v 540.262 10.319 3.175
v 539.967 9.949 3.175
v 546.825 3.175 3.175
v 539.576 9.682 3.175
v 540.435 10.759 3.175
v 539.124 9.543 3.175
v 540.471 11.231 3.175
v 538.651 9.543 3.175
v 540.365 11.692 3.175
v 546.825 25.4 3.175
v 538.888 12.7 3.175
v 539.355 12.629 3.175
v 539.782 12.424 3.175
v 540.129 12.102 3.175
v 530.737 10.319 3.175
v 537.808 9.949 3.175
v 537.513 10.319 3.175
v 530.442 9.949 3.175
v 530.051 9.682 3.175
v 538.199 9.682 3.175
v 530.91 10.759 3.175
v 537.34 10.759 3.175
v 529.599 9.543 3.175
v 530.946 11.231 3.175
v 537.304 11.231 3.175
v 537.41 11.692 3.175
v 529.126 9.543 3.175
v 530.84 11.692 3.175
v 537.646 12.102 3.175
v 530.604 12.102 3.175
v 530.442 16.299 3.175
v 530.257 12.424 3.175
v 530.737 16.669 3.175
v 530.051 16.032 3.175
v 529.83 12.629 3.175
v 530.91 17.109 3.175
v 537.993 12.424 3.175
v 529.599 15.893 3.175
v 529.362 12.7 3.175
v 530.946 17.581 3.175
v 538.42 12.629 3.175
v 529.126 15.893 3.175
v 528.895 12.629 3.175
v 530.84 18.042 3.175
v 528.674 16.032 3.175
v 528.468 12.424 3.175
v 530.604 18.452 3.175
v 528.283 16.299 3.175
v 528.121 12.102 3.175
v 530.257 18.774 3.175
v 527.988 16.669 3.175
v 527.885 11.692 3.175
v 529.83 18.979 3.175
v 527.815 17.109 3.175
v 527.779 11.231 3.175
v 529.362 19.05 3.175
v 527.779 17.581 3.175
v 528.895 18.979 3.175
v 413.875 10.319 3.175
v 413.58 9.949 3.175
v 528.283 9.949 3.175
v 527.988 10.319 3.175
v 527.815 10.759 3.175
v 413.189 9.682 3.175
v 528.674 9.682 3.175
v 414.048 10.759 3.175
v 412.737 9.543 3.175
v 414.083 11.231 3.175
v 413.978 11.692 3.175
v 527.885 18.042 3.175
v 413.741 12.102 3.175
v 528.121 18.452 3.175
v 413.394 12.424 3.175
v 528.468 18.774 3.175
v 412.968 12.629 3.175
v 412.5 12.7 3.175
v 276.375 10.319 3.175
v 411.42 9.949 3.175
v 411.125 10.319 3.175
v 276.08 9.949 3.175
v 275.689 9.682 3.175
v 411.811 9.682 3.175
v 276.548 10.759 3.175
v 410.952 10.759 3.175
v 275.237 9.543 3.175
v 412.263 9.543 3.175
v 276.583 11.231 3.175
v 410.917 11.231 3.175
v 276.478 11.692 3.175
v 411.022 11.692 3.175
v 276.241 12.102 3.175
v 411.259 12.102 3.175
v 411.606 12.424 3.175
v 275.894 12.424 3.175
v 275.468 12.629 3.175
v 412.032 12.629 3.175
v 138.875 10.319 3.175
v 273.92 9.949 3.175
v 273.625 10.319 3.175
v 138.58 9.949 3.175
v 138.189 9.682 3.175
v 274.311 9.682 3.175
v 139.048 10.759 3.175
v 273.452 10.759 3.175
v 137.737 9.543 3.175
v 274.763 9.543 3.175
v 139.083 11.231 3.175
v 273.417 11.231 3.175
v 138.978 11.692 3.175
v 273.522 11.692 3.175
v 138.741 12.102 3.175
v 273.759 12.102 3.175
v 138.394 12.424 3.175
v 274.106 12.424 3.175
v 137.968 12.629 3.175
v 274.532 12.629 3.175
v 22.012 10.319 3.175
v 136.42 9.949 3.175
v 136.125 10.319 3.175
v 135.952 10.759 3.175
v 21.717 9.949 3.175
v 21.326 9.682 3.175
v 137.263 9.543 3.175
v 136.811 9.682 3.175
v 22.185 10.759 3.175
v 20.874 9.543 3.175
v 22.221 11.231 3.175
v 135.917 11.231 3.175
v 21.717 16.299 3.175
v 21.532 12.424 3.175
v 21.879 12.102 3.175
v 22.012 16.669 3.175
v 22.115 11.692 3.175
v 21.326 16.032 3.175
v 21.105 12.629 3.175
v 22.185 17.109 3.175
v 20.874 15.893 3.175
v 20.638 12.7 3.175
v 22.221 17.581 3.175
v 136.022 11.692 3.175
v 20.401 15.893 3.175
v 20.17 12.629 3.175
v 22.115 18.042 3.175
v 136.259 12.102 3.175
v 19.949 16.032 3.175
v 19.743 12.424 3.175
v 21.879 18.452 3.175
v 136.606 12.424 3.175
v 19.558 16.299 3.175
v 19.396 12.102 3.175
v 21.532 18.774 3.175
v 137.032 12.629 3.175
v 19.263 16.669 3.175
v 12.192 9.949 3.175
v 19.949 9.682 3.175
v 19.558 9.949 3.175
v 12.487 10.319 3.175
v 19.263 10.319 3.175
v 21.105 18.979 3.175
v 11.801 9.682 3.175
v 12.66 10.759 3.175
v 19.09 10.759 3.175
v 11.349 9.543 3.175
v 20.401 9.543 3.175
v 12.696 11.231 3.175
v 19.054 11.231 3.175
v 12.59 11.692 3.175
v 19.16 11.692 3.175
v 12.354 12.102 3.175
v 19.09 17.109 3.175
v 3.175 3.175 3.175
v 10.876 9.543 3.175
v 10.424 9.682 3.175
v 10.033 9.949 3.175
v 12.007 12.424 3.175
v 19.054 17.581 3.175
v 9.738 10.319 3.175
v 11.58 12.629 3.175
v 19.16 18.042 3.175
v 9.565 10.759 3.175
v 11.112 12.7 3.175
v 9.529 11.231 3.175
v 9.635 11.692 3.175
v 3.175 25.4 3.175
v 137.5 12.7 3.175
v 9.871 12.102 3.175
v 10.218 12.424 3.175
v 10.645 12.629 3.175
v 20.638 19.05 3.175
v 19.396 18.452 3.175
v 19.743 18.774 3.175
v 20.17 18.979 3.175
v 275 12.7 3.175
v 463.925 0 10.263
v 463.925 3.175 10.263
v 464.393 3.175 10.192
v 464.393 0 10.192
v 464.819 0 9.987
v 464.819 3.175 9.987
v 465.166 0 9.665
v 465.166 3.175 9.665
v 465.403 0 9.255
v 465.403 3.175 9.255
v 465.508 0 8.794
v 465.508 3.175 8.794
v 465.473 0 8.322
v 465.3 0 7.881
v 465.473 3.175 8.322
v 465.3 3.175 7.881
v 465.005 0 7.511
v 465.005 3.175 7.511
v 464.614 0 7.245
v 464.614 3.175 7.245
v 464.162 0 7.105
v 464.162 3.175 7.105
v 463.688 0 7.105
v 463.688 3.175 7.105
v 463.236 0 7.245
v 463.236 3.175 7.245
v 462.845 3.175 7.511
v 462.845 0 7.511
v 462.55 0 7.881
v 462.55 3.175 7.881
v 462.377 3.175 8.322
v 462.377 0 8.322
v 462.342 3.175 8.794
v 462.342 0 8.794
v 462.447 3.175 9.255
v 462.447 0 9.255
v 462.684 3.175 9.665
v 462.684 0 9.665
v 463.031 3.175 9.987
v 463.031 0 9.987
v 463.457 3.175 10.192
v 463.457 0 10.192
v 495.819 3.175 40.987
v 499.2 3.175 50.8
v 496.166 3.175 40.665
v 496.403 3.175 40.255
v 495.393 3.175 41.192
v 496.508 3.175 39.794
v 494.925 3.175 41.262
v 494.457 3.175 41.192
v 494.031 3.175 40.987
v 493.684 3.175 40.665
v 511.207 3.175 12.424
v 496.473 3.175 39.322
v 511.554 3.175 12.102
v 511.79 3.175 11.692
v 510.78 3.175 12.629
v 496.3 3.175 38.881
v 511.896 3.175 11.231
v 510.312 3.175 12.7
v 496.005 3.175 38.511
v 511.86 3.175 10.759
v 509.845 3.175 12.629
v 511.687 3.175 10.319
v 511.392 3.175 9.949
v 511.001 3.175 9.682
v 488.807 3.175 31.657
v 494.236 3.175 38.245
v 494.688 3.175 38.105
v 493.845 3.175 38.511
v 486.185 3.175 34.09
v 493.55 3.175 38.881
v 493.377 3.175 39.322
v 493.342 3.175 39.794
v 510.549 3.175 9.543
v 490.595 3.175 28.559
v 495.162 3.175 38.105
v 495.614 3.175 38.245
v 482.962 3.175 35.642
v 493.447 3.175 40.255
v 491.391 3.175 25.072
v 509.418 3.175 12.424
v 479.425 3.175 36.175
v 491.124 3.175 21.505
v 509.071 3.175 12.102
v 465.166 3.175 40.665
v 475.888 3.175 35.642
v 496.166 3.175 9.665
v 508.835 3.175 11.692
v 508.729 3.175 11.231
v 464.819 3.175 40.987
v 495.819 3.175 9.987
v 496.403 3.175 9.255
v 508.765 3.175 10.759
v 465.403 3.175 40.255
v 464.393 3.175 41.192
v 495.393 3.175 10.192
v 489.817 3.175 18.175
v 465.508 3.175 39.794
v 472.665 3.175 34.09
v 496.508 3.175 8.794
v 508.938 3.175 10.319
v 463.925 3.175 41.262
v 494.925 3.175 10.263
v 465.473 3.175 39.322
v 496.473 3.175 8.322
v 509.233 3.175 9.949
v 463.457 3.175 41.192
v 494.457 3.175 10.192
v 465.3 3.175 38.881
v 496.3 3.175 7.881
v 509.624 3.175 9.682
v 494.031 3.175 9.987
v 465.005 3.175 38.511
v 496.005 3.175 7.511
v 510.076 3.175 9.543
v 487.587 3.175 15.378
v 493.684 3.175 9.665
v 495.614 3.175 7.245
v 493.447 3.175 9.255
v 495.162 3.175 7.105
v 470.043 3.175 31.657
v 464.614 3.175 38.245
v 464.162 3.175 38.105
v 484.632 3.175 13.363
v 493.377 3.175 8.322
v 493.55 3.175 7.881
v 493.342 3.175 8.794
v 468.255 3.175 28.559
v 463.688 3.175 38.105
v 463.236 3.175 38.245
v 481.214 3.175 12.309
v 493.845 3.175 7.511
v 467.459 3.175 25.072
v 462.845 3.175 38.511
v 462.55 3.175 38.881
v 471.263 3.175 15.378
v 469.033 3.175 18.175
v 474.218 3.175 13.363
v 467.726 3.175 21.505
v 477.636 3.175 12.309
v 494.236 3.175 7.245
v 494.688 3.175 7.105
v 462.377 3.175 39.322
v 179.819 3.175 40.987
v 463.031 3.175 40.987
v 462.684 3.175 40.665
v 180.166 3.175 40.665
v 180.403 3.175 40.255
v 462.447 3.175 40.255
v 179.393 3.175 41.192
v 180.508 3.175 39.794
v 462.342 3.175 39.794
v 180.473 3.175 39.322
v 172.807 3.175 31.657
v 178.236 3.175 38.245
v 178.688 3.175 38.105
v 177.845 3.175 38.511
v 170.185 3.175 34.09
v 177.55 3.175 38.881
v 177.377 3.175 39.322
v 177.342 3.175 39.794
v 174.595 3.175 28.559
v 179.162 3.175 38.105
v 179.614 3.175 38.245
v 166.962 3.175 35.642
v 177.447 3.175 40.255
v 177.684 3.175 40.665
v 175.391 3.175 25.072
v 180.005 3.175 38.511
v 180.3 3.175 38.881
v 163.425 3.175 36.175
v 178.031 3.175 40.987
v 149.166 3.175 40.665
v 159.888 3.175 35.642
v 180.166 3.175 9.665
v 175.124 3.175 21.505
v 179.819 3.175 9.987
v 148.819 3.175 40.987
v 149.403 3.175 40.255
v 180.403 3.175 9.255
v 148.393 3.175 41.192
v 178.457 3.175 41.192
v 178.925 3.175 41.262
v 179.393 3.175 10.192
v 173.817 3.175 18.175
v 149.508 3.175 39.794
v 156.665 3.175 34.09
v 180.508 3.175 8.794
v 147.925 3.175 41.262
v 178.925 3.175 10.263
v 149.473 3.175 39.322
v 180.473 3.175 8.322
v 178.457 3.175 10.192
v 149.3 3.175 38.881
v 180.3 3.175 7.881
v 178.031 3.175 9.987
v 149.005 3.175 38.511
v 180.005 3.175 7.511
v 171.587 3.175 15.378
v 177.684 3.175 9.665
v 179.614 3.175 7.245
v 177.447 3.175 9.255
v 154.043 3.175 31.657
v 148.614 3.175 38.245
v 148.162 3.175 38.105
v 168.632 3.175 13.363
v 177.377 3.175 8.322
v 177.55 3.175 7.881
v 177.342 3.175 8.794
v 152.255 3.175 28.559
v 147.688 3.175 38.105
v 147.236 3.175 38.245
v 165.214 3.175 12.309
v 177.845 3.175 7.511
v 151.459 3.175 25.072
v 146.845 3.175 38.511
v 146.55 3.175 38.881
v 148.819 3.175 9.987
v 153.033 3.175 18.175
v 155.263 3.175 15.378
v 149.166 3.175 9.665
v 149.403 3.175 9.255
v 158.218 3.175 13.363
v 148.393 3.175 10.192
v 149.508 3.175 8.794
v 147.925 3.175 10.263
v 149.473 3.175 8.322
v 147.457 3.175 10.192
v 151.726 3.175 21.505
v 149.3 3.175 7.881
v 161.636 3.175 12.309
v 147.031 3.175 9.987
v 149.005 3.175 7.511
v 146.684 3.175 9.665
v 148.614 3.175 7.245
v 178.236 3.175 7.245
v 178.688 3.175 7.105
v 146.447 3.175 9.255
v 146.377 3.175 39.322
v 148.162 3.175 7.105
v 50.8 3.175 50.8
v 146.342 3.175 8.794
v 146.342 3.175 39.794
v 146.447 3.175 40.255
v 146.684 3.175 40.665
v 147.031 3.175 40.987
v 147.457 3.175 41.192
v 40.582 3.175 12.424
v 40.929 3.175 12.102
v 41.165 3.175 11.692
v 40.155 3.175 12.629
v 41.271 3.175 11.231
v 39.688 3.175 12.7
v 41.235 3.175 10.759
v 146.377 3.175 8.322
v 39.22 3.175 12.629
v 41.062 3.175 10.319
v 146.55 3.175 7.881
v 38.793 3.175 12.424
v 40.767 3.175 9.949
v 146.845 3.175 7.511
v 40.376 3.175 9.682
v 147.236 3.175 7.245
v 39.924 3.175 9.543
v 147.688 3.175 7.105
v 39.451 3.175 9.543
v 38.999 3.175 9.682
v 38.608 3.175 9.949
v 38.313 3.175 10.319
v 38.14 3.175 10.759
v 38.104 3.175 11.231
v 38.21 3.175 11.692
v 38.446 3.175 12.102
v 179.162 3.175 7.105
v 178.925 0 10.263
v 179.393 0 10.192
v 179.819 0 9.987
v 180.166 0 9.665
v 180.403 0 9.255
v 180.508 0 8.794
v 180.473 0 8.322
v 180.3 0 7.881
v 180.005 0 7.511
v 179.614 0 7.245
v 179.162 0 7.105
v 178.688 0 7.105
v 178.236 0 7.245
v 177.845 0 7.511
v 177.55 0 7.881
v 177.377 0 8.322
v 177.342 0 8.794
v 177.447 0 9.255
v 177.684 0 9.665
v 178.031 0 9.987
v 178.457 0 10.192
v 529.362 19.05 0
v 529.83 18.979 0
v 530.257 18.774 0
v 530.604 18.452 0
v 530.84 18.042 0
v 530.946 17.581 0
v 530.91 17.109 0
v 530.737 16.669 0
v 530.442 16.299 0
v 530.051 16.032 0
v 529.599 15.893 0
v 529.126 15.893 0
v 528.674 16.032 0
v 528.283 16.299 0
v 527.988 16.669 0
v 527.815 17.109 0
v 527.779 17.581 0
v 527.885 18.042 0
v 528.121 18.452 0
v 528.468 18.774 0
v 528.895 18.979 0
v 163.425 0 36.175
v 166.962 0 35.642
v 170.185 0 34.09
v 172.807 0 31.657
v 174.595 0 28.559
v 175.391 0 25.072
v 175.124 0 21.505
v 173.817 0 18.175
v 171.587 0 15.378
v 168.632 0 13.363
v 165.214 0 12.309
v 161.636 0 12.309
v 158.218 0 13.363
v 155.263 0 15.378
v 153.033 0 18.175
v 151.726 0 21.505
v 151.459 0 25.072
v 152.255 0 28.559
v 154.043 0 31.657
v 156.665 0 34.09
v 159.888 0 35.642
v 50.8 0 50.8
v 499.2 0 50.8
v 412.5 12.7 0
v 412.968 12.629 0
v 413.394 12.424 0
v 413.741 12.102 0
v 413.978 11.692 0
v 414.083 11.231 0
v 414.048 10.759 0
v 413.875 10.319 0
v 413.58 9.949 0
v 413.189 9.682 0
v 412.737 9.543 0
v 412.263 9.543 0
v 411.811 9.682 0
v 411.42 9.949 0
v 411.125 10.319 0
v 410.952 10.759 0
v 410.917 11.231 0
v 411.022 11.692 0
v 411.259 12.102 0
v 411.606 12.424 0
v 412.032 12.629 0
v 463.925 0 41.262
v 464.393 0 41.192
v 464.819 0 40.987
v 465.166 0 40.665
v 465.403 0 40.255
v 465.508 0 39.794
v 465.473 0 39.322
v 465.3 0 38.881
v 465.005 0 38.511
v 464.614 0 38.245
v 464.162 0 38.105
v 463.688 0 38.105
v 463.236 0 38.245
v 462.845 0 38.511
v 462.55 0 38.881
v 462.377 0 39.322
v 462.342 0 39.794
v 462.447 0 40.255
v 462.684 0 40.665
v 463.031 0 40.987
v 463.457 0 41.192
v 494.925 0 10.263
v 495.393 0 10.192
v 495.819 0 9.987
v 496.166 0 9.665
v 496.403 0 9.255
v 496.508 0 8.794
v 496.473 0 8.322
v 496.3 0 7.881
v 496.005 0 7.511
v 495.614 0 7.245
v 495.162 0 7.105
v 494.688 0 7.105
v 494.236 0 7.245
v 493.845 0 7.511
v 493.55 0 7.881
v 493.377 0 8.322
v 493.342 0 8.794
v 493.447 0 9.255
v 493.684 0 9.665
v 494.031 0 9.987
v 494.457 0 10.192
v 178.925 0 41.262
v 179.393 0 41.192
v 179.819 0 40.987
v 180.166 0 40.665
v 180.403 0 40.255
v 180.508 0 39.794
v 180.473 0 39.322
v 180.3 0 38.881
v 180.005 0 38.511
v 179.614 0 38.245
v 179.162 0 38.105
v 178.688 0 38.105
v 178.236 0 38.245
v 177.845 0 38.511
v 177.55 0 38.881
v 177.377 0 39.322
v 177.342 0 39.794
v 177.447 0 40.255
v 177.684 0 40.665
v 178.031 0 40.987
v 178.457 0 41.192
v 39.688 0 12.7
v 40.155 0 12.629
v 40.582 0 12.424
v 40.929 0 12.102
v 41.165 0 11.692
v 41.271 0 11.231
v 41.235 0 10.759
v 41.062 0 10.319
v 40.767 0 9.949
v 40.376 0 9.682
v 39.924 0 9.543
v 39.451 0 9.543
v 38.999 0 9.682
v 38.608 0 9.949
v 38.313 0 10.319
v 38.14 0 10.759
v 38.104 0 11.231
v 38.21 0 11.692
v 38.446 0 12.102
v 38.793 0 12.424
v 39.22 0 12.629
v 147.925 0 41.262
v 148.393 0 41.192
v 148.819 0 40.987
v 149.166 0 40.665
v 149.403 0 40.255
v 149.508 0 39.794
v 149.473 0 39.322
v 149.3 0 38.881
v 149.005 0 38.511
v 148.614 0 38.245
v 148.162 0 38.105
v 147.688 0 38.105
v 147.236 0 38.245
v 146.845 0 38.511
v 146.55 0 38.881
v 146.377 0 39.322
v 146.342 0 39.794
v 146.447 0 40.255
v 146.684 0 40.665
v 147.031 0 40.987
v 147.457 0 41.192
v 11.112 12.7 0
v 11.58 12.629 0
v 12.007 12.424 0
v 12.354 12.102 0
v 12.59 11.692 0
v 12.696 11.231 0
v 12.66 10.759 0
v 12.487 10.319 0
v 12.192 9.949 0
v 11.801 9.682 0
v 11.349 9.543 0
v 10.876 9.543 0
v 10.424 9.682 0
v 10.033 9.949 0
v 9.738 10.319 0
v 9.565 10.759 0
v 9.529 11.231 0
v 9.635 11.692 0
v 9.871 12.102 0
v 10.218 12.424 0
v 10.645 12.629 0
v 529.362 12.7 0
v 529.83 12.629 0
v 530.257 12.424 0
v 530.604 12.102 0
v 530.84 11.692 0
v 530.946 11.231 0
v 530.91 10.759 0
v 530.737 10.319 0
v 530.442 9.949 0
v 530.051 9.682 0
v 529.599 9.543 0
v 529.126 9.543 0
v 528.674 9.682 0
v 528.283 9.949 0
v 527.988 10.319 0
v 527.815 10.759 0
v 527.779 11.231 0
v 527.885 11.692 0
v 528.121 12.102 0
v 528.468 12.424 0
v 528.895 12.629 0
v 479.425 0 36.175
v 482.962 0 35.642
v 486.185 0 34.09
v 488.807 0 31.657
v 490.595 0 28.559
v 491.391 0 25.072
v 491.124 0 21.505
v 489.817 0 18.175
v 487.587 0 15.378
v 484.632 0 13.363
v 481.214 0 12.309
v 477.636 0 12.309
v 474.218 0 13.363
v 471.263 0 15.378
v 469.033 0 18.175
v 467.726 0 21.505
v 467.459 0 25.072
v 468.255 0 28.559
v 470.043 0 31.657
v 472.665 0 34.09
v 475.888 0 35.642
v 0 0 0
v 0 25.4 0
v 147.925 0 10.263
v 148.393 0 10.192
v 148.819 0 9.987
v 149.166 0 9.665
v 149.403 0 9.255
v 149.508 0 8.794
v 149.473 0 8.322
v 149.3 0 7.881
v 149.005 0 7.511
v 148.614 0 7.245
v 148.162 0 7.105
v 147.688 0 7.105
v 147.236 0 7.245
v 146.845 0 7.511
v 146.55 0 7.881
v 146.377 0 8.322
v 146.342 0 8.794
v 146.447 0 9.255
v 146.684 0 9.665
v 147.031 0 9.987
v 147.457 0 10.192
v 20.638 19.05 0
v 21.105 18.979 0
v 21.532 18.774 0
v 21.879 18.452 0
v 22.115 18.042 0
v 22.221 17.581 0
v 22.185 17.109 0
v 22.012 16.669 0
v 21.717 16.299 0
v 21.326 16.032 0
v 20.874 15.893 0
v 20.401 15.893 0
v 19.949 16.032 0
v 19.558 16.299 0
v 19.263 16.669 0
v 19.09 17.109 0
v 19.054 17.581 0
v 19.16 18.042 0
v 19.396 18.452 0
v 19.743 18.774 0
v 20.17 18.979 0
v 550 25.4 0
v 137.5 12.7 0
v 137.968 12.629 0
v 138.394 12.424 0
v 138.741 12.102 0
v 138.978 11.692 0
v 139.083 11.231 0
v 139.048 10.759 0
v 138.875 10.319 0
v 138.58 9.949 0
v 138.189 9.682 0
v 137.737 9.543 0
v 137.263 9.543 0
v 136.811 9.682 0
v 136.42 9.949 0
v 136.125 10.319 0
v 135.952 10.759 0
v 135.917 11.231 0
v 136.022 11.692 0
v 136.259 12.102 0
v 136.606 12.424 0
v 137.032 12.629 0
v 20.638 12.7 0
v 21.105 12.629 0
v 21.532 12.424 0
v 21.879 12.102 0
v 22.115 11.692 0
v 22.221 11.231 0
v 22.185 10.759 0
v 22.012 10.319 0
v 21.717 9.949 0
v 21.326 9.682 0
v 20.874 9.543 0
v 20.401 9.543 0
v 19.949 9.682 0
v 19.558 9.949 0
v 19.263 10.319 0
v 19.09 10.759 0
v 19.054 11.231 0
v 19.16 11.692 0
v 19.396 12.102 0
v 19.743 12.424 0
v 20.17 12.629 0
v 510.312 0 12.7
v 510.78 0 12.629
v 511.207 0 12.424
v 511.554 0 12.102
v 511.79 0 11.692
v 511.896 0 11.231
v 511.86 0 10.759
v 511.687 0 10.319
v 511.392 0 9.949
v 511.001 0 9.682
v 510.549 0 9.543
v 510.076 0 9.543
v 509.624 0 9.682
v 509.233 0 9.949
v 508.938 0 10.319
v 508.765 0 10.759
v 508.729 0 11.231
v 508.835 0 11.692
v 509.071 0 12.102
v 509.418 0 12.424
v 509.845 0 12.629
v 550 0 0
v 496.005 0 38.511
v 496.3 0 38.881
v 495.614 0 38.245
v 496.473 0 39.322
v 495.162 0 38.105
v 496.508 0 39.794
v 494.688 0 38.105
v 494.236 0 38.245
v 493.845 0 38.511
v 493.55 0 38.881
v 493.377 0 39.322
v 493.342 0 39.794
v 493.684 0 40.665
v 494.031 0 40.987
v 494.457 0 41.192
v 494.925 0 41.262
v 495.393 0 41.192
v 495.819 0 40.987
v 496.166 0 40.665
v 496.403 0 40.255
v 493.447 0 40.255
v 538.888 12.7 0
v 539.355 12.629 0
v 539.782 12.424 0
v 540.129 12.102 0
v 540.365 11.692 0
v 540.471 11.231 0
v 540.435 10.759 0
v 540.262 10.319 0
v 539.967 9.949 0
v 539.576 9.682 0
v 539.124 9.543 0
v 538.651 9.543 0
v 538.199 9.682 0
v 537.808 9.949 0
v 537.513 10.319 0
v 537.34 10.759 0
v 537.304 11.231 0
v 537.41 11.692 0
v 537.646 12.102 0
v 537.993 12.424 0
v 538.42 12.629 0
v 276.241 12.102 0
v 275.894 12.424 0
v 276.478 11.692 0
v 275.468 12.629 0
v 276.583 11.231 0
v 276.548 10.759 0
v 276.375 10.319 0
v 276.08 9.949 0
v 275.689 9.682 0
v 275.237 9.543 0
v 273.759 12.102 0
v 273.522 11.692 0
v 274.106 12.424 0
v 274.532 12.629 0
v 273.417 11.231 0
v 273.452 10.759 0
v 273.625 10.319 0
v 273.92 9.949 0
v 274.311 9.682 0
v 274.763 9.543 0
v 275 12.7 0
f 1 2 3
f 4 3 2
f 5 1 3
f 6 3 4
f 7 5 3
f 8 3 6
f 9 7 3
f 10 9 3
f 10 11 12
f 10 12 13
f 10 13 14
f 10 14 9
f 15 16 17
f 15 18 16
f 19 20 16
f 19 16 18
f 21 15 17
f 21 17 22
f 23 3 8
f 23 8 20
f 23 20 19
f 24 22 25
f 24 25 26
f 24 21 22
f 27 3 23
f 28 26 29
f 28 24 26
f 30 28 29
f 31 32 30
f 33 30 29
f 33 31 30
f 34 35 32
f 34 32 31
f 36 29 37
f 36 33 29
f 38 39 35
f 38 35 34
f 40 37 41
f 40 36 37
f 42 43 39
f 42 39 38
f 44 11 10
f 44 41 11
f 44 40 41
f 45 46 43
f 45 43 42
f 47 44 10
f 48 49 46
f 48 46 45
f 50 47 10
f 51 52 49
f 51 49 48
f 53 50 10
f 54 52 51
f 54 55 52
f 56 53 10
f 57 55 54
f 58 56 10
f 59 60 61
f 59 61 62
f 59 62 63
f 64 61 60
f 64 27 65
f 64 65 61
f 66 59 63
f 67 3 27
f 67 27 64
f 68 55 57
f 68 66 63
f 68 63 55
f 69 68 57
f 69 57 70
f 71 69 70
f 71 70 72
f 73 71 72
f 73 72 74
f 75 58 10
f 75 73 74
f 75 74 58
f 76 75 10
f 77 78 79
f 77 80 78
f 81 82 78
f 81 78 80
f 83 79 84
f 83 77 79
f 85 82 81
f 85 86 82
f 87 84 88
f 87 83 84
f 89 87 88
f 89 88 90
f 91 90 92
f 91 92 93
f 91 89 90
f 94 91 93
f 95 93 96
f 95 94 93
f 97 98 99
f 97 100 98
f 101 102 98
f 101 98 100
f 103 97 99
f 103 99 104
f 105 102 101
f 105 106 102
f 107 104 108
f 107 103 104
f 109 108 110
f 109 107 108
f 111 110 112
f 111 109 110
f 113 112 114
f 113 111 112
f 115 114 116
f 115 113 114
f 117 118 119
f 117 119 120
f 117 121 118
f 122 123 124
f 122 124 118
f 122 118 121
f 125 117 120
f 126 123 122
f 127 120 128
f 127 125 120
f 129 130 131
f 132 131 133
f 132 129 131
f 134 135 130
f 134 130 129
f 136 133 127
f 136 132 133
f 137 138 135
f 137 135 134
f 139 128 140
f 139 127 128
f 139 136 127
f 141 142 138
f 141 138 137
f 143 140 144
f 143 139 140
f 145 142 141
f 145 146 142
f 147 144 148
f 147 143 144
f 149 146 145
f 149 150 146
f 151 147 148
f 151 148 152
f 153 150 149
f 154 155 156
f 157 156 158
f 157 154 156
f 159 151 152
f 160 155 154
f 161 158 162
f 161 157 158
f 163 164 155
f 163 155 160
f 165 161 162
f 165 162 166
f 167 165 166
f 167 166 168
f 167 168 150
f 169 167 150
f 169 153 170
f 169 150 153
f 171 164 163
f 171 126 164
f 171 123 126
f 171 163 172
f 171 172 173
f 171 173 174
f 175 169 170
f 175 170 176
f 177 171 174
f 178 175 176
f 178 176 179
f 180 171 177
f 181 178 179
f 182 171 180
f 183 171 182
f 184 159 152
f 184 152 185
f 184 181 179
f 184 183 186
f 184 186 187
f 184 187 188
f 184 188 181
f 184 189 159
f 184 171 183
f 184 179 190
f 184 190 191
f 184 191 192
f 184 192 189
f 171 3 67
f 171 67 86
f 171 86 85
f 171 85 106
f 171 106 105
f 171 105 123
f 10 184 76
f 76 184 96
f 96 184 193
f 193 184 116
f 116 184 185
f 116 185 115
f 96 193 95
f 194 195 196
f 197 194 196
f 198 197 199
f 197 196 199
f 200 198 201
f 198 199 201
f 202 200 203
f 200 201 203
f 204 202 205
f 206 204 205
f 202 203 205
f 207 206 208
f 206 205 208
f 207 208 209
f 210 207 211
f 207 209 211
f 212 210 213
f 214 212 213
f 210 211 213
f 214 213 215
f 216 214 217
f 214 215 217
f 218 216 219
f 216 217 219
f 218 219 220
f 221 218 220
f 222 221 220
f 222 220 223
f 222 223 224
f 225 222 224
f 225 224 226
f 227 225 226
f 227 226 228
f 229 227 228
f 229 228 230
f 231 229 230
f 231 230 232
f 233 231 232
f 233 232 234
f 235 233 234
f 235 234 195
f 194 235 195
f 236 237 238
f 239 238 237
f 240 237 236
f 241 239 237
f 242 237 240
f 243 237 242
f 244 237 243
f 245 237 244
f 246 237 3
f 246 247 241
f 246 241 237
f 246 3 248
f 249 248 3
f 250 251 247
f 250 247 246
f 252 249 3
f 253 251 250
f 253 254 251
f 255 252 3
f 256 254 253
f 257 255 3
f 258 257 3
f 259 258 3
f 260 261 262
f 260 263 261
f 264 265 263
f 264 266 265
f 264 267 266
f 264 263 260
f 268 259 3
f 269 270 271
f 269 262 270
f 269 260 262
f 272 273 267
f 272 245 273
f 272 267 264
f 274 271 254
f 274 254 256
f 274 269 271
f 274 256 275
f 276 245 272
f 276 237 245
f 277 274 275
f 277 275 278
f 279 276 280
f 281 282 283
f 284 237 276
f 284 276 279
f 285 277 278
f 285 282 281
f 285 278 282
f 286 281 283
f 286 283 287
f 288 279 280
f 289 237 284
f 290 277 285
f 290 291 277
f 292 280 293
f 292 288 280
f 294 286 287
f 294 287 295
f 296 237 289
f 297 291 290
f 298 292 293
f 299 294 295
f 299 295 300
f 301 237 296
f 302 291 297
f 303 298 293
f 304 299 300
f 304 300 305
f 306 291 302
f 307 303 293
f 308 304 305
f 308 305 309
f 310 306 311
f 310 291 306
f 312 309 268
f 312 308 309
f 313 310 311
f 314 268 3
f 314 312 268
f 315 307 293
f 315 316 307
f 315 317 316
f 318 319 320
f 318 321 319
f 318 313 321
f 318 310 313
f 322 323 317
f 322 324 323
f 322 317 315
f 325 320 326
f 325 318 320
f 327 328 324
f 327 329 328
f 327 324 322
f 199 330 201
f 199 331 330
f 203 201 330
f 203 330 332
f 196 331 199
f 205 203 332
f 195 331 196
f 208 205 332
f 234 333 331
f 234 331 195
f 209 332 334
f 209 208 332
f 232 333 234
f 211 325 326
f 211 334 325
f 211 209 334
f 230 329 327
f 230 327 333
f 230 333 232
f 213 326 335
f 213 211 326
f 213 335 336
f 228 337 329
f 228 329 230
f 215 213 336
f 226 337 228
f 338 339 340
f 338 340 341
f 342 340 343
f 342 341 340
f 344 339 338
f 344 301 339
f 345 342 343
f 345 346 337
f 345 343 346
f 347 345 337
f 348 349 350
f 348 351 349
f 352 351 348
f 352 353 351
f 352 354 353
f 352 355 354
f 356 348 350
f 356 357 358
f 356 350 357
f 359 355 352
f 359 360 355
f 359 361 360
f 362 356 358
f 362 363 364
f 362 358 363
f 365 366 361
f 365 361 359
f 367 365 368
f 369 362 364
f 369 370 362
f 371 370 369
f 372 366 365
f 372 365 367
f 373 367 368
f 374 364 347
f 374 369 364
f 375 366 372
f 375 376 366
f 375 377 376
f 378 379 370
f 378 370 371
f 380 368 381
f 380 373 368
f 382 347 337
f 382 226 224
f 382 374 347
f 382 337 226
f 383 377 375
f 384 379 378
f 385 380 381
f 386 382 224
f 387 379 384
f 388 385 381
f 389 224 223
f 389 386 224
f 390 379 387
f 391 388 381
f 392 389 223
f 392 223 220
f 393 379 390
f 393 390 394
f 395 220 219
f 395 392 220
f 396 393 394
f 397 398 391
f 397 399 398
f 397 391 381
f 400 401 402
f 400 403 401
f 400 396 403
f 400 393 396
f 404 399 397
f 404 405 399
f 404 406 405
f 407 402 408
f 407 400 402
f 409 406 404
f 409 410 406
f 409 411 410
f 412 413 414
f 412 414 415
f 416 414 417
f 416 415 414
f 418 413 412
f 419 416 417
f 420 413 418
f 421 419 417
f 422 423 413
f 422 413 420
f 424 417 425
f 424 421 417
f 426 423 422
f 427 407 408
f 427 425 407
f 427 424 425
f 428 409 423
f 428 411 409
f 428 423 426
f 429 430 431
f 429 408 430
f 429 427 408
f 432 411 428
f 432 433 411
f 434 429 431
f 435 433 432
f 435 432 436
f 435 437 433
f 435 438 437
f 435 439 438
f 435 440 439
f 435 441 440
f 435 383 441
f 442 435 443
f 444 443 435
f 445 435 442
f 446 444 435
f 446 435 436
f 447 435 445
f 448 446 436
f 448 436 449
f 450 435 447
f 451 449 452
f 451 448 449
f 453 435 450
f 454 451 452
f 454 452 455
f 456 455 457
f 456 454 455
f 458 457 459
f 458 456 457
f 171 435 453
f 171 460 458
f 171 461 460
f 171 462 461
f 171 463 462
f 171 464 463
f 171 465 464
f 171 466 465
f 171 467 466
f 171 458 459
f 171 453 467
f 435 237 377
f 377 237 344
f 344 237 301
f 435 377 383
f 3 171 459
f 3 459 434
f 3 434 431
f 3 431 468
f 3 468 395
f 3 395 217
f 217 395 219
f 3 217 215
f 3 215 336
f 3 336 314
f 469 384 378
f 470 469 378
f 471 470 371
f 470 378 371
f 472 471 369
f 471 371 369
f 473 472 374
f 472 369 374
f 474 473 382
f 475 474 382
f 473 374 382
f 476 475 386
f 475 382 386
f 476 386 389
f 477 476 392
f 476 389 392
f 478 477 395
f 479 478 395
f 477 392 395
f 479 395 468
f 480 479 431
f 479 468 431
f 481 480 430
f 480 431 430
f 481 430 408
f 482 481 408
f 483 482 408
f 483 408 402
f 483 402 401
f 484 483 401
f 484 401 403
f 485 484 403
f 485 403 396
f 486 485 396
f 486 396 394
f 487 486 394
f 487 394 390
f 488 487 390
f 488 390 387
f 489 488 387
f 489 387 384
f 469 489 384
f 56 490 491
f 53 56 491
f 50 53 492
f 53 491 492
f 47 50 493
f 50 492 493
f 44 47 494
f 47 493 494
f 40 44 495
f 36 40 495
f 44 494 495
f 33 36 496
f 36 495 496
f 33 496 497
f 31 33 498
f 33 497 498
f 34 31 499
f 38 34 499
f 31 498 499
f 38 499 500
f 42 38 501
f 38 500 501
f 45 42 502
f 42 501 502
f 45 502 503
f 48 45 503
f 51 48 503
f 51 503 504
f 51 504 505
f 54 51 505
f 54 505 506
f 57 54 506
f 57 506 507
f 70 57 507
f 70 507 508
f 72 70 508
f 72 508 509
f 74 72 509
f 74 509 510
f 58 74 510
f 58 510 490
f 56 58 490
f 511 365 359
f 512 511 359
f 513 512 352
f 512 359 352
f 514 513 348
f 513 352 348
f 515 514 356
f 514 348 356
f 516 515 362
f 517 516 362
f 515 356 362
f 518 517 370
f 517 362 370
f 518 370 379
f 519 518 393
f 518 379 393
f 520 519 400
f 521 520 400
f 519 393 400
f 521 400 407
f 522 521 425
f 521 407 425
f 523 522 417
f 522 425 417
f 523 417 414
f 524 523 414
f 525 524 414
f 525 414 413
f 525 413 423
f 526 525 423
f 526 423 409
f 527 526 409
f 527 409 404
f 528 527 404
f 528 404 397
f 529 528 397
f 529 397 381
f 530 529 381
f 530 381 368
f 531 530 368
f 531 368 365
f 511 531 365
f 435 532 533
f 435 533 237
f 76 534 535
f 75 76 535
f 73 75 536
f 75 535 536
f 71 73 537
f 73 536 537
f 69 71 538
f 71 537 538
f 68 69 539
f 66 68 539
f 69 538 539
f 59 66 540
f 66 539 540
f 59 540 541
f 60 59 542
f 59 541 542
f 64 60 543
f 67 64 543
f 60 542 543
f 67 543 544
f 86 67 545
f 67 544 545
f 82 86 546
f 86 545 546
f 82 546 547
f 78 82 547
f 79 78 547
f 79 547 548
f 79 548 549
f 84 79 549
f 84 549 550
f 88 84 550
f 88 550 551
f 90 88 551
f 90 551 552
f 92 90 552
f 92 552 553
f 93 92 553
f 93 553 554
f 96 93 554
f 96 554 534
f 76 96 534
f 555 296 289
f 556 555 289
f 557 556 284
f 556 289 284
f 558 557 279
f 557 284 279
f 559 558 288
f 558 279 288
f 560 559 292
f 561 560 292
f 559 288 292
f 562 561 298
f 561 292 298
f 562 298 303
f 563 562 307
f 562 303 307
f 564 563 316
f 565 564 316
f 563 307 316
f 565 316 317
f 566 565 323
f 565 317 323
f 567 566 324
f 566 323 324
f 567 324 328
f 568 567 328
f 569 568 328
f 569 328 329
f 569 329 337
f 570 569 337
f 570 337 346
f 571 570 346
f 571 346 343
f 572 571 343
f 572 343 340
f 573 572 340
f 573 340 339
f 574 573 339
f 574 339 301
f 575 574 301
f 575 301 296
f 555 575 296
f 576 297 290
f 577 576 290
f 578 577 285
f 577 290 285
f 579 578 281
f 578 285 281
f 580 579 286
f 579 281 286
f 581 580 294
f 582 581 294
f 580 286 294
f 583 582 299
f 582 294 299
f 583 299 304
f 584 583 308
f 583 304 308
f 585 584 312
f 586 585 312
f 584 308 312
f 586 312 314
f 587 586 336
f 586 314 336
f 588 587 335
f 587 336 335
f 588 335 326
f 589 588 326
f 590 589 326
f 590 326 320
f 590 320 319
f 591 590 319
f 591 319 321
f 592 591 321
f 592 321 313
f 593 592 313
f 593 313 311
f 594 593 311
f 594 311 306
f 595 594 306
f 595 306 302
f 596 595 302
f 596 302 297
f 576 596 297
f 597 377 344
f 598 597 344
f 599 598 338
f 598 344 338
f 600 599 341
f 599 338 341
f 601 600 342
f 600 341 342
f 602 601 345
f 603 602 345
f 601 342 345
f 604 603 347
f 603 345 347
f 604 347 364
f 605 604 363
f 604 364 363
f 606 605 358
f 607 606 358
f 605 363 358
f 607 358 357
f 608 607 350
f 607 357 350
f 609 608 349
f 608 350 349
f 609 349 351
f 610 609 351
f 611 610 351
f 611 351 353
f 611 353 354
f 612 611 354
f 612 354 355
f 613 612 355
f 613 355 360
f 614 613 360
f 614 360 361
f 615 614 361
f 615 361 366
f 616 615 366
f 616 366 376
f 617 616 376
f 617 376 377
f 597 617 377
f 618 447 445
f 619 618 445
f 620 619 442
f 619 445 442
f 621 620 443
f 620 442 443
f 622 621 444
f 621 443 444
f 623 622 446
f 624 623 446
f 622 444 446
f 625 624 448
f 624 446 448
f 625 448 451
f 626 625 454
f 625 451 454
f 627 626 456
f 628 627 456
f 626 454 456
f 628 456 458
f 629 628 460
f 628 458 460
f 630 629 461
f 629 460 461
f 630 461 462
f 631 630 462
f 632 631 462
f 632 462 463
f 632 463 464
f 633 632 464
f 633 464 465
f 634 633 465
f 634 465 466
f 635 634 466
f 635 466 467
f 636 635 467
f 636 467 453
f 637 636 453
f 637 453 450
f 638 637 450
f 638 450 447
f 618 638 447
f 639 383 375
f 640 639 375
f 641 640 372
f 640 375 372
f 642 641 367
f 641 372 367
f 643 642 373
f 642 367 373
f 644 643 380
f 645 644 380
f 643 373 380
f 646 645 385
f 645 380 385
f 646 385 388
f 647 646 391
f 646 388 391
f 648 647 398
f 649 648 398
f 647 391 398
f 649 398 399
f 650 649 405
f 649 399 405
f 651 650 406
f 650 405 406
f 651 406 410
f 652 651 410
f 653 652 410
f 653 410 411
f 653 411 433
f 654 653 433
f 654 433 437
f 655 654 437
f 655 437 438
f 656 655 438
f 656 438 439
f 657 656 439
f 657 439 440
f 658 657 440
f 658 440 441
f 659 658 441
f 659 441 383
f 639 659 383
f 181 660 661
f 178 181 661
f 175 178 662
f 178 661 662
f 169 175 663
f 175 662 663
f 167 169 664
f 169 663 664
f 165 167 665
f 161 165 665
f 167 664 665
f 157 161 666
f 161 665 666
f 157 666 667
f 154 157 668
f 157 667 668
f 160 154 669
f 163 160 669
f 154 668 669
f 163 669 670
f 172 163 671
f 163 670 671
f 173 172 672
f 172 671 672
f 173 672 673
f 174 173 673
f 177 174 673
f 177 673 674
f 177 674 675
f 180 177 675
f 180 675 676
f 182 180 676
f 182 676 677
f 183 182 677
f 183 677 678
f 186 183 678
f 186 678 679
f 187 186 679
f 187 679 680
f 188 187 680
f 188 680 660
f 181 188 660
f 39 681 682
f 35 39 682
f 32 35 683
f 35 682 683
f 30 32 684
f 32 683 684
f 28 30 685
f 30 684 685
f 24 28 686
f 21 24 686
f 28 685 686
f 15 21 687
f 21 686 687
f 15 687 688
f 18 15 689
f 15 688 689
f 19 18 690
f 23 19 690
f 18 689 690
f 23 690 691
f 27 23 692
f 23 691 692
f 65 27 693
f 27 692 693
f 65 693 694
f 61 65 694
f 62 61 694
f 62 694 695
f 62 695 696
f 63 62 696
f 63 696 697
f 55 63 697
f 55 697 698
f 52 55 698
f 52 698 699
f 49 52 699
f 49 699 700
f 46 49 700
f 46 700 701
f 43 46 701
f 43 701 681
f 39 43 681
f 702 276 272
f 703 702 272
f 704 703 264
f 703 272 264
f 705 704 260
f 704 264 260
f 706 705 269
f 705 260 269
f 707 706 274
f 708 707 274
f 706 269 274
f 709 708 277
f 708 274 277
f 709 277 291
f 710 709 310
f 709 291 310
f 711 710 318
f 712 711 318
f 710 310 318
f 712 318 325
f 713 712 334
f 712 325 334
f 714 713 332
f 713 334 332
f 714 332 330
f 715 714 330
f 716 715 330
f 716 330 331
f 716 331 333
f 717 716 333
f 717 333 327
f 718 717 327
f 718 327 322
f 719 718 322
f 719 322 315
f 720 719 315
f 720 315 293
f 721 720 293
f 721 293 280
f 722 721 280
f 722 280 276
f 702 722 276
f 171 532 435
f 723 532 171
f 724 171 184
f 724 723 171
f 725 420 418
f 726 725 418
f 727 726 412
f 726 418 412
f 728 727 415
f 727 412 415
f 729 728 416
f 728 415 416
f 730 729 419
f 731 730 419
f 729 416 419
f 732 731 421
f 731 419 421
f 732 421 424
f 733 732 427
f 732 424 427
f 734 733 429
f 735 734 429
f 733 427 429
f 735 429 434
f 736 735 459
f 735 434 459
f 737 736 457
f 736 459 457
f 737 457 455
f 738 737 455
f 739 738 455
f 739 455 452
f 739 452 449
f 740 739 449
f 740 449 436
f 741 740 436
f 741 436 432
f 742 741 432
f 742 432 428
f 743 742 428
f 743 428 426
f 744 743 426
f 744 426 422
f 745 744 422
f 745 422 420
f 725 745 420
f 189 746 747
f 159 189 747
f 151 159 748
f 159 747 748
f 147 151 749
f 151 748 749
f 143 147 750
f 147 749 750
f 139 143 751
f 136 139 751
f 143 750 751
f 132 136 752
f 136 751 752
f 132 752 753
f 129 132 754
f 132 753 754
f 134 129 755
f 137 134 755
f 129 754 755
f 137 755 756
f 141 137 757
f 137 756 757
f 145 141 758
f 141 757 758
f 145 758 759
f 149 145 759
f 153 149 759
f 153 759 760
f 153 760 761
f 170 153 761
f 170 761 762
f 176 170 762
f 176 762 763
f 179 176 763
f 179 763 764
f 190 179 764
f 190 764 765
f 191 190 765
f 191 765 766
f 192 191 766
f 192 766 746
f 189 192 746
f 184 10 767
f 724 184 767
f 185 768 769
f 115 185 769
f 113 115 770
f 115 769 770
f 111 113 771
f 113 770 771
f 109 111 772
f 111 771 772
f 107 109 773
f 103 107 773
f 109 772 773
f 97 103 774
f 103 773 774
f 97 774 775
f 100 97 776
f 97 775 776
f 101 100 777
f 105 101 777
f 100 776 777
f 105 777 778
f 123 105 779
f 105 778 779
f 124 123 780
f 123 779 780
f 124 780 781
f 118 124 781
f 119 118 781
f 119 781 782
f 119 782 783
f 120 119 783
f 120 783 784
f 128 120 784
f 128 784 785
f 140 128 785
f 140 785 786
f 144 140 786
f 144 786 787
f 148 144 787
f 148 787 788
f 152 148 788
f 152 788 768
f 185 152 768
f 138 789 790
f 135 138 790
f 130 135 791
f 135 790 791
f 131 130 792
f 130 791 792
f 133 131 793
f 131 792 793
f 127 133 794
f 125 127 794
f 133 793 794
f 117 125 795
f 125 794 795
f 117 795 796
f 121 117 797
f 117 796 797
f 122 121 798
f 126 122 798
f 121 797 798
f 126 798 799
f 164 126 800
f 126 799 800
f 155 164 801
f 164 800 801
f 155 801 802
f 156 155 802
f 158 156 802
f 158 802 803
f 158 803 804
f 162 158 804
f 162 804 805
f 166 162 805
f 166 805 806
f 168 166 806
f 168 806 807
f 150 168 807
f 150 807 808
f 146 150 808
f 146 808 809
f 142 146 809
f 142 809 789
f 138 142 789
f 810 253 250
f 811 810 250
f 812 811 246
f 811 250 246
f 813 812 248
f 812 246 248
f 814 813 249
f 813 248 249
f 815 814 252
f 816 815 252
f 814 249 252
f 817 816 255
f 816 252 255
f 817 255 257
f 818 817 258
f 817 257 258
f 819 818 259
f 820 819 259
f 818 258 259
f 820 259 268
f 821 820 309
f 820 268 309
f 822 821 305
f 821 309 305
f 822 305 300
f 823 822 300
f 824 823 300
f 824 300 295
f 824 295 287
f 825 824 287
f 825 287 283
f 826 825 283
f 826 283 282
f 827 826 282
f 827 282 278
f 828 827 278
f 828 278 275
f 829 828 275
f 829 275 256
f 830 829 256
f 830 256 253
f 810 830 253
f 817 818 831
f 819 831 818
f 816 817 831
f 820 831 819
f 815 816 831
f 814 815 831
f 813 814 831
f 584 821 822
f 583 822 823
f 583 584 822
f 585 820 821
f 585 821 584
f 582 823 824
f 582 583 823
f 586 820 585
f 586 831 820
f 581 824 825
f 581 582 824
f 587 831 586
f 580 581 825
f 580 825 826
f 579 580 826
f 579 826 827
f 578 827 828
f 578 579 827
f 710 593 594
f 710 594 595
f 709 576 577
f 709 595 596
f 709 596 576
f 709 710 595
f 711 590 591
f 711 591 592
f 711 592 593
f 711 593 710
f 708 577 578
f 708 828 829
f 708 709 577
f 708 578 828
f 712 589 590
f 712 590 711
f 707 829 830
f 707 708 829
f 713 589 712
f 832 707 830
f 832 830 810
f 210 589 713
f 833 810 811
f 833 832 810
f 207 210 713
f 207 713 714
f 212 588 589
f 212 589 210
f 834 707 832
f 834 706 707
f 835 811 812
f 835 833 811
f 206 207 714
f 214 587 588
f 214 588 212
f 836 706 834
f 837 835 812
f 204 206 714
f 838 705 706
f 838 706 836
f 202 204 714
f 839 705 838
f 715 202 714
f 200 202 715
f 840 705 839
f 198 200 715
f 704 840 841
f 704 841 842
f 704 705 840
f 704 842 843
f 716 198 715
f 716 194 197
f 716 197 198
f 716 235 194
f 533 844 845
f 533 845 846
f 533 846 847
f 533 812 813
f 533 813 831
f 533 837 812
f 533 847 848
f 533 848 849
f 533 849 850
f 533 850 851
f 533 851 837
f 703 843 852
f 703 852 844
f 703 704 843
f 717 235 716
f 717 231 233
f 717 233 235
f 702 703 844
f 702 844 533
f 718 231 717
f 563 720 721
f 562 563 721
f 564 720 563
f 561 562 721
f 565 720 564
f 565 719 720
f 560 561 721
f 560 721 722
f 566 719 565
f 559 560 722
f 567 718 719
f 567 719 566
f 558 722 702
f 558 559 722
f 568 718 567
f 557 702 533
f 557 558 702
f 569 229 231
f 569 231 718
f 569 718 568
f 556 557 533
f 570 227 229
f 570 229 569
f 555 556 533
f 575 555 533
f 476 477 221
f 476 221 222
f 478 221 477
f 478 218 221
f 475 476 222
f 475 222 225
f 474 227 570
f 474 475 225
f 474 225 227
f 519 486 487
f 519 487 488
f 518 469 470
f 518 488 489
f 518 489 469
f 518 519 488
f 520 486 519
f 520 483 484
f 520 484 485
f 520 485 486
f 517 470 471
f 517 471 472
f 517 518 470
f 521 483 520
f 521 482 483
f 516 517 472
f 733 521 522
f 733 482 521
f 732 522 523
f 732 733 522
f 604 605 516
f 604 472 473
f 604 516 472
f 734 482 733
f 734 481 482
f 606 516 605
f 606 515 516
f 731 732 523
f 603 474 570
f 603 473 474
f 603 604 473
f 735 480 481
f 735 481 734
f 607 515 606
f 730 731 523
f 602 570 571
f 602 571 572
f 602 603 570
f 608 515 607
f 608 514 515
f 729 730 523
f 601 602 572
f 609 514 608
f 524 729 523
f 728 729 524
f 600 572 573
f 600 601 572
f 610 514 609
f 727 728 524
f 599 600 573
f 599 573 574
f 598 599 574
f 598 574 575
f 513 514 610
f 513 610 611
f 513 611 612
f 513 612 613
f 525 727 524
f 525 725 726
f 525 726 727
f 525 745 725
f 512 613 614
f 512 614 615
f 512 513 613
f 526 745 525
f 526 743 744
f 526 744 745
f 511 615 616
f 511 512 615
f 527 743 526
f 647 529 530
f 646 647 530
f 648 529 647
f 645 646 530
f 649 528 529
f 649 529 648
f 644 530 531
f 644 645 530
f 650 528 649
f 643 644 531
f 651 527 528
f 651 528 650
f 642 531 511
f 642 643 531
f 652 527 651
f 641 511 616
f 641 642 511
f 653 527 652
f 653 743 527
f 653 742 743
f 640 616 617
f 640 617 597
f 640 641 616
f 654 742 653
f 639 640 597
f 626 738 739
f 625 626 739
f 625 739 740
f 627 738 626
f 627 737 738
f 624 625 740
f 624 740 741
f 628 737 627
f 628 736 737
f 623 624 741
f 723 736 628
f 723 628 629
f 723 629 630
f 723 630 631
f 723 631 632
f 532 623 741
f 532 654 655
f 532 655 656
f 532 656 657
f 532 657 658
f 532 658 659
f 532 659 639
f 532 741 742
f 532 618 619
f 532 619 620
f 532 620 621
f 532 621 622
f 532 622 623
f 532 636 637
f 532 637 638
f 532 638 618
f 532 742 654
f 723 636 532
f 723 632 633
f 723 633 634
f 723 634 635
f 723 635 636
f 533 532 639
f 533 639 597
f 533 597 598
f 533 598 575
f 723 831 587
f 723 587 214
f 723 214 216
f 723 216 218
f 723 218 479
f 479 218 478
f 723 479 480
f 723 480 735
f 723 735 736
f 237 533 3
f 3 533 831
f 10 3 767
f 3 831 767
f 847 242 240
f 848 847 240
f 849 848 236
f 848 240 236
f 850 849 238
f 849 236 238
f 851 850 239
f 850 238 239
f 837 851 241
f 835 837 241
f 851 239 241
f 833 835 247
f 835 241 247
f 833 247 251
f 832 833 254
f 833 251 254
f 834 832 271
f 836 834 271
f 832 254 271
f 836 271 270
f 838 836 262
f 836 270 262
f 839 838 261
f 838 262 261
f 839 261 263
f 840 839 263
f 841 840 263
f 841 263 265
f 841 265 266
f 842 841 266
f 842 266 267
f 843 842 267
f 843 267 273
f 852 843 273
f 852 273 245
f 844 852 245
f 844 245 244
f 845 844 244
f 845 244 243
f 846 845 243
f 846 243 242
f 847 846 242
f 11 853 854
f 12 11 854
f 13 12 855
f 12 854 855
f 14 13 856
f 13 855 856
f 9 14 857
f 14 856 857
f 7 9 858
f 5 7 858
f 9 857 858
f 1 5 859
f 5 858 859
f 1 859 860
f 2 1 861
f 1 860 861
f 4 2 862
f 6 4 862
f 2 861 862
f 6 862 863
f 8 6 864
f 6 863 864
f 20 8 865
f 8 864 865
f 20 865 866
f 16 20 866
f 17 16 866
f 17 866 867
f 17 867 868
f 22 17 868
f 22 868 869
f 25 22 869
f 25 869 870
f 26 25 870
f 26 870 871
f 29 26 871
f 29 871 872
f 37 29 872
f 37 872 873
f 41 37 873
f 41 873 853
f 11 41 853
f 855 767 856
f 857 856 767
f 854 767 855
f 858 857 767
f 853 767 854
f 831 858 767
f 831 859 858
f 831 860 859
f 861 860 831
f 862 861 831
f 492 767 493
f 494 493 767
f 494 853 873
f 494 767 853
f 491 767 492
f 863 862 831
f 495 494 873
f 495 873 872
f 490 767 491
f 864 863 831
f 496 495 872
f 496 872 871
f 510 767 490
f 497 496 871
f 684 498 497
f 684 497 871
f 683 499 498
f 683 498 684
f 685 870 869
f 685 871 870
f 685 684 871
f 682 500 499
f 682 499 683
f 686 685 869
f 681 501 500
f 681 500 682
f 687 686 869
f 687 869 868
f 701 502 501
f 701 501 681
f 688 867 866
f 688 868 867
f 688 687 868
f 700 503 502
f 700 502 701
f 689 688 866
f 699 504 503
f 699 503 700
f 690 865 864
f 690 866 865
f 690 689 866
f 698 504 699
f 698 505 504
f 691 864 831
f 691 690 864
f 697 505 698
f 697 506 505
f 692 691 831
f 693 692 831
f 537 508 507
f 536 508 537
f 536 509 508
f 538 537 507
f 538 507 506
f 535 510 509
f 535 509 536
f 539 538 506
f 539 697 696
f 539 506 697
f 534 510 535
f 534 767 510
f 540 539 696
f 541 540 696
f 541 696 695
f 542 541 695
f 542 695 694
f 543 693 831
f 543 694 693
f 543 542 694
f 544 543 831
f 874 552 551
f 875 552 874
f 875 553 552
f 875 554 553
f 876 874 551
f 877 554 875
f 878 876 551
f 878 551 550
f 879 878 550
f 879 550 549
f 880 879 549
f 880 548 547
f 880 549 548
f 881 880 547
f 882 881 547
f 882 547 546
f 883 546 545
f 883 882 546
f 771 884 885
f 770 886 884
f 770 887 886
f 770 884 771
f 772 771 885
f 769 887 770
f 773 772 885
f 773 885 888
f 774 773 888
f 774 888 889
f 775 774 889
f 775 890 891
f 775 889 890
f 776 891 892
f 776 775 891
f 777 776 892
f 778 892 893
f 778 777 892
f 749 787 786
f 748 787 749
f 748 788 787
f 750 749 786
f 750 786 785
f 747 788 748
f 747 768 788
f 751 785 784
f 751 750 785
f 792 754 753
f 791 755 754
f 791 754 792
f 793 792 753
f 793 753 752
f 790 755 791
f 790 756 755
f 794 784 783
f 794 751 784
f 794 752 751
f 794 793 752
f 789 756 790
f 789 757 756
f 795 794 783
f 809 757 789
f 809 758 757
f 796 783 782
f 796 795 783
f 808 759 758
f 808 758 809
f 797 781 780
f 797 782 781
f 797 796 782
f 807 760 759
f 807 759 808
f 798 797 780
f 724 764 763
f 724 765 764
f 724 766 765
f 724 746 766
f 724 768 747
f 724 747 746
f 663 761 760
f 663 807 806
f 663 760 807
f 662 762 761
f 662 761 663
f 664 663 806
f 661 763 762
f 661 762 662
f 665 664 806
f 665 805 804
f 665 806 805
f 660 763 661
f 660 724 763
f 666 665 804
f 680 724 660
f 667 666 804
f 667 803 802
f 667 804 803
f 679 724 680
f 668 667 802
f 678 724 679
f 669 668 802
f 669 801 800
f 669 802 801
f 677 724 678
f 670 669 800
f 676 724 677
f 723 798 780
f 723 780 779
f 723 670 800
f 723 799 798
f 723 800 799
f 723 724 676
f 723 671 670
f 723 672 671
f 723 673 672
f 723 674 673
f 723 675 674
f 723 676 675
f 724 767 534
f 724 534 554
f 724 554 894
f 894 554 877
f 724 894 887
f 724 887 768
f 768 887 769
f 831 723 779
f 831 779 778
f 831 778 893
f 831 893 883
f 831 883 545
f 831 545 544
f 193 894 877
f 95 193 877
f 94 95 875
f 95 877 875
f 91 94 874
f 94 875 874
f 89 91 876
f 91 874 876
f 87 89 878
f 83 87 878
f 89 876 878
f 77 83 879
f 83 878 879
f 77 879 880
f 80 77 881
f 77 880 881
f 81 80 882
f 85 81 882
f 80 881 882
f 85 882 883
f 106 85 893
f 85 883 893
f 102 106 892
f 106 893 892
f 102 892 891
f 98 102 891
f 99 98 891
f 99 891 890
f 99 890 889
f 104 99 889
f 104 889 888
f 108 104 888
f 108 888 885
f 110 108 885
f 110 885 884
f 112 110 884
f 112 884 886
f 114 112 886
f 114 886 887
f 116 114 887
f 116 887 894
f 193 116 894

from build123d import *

# Parameters (mm, degrees)
BOSS_EXTRUDE1_DEPTH               = 550
CHAMFER7_SIZE                     = 50.8
CHAMFER8_SIZE                     = 50.8
BOTTHOMHOLES_SKETCH2_R            = 12
BOTTHOMHOLES_SKETCH2_R_2          = 1.5875
BOTTOMHOLES_CUT_EXTRUDE1_DEPTH    = 553.788015993
RIGHTSIDEHOLES_SKETCH3_R          = 1.5875
RIGHTSIDEHOLES_CUT_EXTRUDE2_DEPTH = 553.924768843


with BuildPart() as part:
    # Sketch1 → Boss-Extrude1 (new body)
    with BuildSketch(Plane(origin=(0, 0, 0), x_dir=(0, 0, -1), z_dir=(1, 0, 0))):
        Polygon((0, 0), (-50.8, 0), (-50.8, 3.175), (-3.175, 3.175), (-3.175, 25.4), (0, 25.4), align=None)
    extrude(amount=BOSS_EXTRUDE1_DEPTH)

    # Chamfer7
    chamfer7_edges = [part.edges().sort_by_distance(p)[0] for p in [
        (0, 1.5875, 50.8),
    ]]
    chamfer(chamfer7_edges, length=CHAMFER7_SIZE - 0.0001)  # a hair under: the kernel refuses the full size

    # Chamfer8
    chamfer8_edges = [part.edges().sort_by_distance(p)[0] for p in [
        (550, 1.5875, 50.8),
    ]]
    chamfer(chamfer8_edges, length=CHAMFER8_SIZE - 0.0001)  # a hair under: the kernel refuses the full size

    # BotthomHoles-Sketch2 → BottomHoles-Cut-Extrude1 (cut, through all)
    with BuildSketch(Plane(origin=(0, 3.175, 0), x_dir=(1, 0, 0), z_dir=(0, 1, 0))):
        with Locations(Location((479.425, -24.175, 0), (0, 0, 270))):
            Circle(BOTTHOMHOLES_SKETCH2_R)
        with Locations(Location((463.925, -8.675, 0), (0, 0, 270))):
            Circle(BOTTHOMHOLES_SKETCH2_R_2)
        with Locations(Location((494.925, -8.675, 0), (0, 0, 270))):
            Circle(BOTTHOMHOLES_SKETCH2_R_2)
        with Locations(Location((463.925, -39.675, 0), (0, 0, 270))):
            Circle(BOTTHOMHOLES_SKETCH2_R_2)
        with Locations(Location((494.925, -39.675, 0), (0, 0, 270))):
            Circle(BOTTHOMHOLES_SKETCH2_R_2)
        with Locations(Location((39.6875, -11.1125, 0), (0, 0, 270))):
            Circle(BOTTHOMHOLES_SKETCH2_R_2)
        with Locations(Location((510.3125, -11.1125, 0), (0, 0, 270))):
            Circle(BOTTHOMHOLES_SKETCH2_R_2)
        with Locations(Location((178.925, -39.675, 0), (0, 0, 270))):
            Circle(BOTTHOMHOLES_SKETCH2_R_2)
        with Locations(Location((147.925, -39.675, 0), (0, 0, 270))):
            Circle(BOTTHOMHOLES_SKETCH2_R_2)
        with Locations(Location((178.925, -8.675, 0), (0, 0, 270))):
            Circle(BOTTHOMHOLES_SKETCH2_R_2)
        with Locations(Location((147.925, -8.675, 0), (0, 0, 270))):
            Circle(BOTTHOMHOLES_SKETCH2_R_2)
        with Locations(Location((163.425, -24.175, 0), (0, 0, 270))):
            Circle(BOTTHOMHOLES_SKETCH2_R)
    extrude(amount=-BOTTOMHOLES_CUT_EXTRUDE1_DEPTH, mode=Mode.SUBTRACT)

    # RightSideHoles-Sketch3 → RightSideHoles-Cut-Extrude2 (cut, through all)
    with BuildSketch(Plane(origin=(0, 0, 0), x_dir=(-1, 0, 0), z_dir=(0, 0, -1))):
        with Locations(Location((-529.3625, 17.4625, 0), (0, 0, 90))):
            Circle(RIGHTSIDEHOLES_SKETCH3_R)
        with Locations(Location((-538.8875, 11.1125, 0), (0, 0, 90))):
            Circle(RIGHTSIDEHOLES_SKETCH3_R)
        with Locations(Location((-529.3625, 11.1125, 0), (0, 0, 90))):
            Circle(RIGHTSIDEHOLES_SKETCH3_R)
        with Locations(Location((-11.1125, 11.1125, 0), (0, 0, 90))):
            Circle(RIGHTSIDEHOLES_SKETCH3_R)
        with Locations(Location((-20.6375, 11.1125, 0), (0, 0, 90))):
            Circle(RIGHTSIDEHOLES_SKETCH3_R)
        with Locations(Location((-20.6375, 17.4625, 0), (0, 0, 90))):
            Circle(RIGHTSIDEHOLES_SKETCH3_R)
        with Locations(Location((-412.5, 11.1125, 0), (0, 0, 90))):
            Circle(RIGHTSIDEHOLES_SKETCH3_R)
        with Locations(Location((-275, 11.1125, 0), (0, 0, 90))):
            Circle(RIGHTSIDEHOLES_SKETCH3_R)
        with Locations(Location((-137.5, 11.1125, 0), (0, 0, 90))):
            Circle(RIGHTSIDEHOLES_SKETCH3_R)
    extrude(amount=-RIGHTSIDEHOLES_CUT_EXTRUDE2_DEPTH, mode=Mode.SUBTRACT)


solid = part.part
